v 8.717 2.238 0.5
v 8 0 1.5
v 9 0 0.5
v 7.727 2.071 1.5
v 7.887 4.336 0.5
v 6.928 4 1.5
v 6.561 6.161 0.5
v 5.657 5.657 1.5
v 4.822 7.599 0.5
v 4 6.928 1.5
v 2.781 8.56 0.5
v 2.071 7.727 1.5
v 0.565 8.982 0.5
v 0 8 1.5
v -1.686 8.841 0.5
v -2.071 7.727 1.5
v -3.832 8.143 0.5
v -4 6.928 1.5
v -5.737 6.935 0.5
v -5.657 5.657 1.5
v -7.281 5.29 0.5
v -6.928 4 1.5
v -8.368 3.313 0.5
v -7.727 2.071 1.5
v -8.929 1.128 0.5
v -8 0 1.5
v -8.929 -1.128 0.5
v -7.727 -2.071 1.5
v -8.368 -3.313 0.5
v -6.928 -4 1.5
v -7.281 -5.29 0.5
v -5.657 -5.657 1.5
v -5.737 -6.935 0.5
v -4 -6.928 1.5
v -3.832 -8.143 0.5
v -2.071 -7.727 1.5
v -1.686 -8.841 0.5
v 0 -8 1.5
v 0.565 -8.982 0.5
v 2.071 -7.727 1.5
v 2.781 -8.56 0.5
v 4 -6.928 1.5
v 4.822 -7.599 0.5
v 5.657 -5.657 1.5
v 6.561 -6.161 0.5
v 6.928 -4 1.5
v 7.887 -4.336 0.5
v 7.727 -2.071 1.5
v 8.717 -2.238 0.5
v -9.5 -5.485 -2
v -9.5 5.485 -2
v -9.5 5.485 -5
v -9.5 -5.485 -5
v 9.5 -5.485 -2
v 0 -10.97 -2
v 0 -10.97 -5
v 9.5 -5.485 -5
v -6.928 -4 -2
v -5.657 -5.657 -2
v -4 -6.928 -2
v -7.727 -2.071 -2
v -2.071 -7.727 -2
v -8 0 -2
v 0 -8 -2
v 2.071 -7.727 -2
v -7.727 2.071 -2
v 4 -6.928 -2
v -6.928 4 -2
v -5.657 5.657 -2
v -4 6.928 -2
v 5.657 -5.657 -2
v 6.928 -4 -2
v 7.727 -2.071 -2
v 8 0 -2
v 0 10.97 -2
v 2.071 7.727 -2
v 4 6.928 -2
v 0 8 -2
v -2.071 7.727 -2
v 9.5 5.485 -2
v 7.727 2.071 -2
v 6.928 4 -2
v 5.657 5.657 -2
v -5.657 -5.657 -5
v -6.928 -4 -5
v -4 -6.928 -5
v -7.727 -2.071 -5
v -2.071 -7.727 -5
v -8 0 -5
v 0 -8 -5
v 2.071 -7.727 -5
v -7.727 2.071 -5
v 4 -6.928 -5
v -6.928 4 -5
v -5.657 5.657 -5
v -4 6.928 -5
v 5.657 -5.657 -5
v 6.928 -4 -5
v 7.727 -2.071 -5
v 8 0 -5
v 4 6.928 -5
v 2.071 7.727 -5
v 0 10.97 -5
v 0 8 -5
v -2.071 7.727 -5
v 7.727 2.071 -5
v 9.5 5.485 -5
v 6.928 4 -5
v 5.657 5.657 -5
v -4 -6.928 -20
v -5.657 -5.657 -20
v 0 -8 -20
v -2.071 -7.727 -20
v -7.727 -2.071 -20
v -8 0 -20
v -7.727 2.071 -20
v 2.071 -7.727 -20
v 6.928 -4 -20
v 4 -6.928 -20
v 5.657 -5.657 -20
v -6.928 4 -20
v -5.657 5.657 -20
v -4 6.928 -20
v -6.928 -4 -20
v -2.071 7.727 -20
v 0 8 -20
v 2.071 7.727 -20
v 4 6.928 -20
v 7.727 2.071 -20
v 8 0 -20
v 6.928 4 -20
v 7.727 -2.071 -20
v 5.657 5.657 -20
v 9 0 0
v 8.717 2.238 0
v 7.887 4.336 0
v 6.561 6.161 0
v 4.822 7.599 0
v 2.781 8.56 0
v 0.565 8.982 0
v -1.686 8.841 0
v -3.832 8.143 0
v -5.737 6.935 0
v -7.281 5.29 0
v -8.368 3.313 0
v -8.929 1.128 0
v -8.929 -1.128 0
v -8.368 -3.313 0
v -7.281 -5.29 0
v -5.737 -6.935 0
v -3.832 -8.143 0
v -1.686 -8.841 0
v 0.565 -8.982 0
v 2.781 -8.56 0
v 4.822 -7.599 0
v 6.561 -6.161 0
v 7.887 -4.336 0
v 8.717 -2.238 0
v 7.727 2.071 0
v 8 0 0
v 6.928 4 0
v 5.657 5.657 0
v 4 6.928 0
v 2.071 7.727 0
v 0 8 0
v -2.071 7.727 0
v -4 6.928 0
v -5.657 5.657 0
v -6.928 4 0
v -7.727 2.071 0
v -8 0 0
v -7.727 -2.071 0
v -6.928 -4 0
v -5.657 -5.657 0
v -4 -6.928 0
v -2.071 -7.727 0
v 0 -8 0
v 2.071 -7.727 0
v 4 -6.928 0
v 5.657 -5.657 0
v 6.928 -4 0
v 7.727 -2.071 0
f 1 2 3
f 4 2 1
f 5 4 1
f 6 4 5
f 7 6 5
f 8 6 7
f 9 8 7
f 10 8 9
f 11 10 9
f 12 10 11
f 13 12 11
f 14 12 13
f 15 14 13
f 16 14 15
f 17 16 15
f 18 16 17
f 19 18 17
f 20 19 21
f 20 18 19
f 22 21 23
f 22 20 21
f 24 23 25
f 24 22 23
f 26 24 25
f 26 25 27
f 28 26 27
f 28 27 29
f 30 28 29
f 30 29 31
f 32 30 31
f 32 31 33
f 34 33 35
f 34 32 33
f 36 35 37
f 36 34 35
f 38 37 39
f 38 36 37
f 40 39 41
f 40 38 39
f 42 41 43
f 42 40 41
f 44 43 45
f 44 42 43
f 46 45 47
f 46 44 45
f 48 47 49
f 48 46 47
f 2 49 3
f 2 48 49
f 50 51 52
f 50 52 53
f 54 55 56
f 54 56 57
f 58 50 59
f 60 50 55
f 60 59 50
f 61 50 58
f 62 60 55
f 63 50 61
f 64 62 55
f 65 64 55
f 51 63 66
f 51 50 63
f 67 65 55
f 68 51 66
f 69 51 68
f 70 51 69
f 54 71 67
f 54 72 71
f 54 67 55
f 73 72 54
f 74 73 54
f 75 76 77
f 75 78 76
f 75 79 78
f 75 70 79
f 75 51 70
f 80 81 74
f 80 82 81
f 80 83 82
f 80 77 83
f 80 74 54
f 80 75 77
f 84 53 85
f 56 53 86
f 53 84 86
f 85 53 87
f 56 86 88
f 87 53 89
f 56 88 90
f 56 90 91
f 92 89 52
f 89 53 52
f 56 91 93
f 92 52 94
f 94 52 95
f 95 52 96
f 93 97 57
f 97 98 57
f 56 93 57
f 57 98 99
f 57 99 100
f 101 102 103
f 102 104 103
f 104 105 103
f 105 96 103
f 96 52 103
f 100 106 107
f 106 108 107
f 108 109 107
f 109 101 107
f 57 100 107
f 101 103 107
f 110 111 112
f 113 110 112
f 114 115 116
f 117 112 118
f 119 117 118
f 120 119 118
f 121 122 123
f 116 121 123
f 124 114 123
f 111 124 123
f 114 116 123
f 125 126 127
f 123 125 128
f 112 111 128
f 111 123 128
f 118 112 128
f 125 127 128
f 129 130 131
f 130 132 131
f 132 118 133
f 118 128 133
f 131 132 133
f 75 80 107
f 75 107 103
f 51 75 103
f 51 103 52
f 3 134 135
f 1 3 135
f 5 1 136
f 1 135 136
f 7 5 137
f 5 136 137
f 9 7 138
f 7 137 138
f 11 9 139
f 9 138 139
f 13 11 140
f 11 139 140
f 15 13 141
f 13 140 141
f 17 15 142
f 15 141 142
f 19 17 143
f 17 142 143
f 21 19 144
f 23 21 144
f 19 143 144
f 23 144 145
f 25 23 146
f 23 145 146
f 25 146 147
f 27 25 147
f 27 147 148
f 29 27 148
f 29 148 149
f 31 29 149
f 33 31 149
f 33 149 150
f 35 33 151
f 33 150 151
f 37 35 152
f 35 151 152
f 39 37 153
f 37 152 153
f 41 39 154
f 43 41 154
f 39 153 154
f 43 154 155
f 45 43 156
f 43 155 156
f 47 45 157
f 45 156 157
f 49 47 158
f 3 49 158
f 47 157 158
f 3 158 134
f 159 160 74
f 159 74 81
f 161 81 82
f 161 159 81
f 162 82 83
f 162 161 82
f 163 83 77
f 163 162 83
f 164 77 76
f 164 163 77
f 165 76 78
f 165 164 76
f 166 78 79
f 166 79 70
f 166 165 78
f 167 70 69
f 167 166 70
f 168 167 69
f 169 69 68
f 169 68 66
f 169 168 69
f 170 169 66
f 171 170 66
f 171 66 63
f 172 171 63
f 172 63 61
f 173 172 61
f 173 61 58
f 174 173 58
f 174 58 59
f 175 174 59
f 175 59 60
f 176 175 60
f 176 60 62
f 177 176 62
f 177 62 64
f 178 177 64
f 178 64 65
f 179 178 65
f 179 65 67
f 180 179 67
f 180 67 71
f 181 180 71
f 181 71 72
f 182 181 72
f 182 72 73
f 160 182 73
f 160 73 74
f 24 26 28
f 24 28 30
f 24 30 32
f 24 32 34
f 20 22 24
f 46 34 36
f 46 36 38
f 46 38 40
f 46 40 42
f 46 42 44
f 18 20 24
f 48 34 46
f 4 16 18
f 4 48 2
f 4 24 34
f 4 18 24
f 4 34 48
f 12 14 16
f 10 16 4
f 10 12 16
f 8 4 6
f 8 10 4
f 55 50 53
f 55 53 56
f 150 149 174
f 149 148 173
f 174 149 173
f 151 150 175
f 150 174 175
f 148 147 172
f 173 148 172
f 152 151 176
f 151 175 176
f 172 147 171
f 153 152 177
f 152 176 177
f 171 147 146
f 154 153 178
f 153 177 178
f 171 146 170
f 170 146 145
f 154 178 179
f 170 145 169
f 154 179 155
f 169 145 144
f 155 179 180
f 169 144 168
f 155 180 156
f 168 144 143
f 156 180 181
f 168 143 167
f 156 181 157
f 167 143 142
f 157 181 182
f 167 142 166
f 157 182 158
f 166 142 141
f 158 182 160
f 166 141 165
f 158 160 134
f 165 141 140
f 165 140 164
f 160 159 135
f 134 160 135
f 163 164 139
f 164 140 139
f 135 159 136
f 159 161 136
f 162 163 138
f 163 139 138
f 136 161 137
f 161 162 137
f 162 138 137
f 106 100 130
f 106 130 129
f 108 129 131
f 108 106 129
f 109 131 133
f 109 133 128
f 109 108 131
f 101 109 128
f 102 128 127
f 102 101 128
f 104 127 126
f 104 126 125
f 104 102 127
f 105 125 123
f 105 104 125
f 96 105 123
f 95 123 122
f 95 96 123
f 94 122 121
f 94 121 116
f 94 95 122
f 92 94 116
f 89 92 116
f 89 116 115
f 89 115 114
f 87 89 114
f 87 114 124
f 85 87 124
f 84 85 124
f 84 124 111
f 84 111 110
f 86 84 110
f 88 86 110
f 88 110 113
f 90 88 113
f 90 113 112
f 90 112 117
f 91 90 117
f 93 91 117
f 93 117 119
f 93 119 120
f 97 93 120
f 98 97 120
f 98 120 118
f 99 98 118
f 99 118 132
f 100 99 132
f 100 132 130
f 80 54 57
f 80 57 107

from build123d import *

# Parameters (mm, degrees)
F0_R     = 8
F1_DEPTH = 20
F0_R_2   = 9
F2_DEPTH = 1.5
F3_SIZE  = 1
F6_DEPTH = 3


with BuildPart() as f1:
    # F0 (on Top) → F1 (new body)
    with BuildSketch(Plane.XY):
        Circle(F0_R)
    extrude(amount=-F1_DEPTH)

    # F0 (on Top) → F2 (join)
    with BuildSketch(Plane.XY):
        Circle(F0_R_2)
        Circle(F0_R, mode=Mode.SUBTRACT)
        Circle(F0_R)
    extrude(amount=F2_DEPTH)

    # F3
    f3_edges = [f1.edges().sort_by_distance(p)[0] for p in [
        (-9, 0, 1.5),
    ]]
    chamfer(f3_edges, length=F3_SIZE)

    # F5 (on offset) → F6 (join)
    with BuildSketch(Plane.XY.offset(-2)):
        Polygon((9.5, 5.484828), (0, 10.969655), (-9.5, 5.484828), (-9.5, -5.484828), (0, -10.969655), (9.5, -5.484828), align=None)
    extrude(amount=-F6_DEPTH)


solid = f1.part
